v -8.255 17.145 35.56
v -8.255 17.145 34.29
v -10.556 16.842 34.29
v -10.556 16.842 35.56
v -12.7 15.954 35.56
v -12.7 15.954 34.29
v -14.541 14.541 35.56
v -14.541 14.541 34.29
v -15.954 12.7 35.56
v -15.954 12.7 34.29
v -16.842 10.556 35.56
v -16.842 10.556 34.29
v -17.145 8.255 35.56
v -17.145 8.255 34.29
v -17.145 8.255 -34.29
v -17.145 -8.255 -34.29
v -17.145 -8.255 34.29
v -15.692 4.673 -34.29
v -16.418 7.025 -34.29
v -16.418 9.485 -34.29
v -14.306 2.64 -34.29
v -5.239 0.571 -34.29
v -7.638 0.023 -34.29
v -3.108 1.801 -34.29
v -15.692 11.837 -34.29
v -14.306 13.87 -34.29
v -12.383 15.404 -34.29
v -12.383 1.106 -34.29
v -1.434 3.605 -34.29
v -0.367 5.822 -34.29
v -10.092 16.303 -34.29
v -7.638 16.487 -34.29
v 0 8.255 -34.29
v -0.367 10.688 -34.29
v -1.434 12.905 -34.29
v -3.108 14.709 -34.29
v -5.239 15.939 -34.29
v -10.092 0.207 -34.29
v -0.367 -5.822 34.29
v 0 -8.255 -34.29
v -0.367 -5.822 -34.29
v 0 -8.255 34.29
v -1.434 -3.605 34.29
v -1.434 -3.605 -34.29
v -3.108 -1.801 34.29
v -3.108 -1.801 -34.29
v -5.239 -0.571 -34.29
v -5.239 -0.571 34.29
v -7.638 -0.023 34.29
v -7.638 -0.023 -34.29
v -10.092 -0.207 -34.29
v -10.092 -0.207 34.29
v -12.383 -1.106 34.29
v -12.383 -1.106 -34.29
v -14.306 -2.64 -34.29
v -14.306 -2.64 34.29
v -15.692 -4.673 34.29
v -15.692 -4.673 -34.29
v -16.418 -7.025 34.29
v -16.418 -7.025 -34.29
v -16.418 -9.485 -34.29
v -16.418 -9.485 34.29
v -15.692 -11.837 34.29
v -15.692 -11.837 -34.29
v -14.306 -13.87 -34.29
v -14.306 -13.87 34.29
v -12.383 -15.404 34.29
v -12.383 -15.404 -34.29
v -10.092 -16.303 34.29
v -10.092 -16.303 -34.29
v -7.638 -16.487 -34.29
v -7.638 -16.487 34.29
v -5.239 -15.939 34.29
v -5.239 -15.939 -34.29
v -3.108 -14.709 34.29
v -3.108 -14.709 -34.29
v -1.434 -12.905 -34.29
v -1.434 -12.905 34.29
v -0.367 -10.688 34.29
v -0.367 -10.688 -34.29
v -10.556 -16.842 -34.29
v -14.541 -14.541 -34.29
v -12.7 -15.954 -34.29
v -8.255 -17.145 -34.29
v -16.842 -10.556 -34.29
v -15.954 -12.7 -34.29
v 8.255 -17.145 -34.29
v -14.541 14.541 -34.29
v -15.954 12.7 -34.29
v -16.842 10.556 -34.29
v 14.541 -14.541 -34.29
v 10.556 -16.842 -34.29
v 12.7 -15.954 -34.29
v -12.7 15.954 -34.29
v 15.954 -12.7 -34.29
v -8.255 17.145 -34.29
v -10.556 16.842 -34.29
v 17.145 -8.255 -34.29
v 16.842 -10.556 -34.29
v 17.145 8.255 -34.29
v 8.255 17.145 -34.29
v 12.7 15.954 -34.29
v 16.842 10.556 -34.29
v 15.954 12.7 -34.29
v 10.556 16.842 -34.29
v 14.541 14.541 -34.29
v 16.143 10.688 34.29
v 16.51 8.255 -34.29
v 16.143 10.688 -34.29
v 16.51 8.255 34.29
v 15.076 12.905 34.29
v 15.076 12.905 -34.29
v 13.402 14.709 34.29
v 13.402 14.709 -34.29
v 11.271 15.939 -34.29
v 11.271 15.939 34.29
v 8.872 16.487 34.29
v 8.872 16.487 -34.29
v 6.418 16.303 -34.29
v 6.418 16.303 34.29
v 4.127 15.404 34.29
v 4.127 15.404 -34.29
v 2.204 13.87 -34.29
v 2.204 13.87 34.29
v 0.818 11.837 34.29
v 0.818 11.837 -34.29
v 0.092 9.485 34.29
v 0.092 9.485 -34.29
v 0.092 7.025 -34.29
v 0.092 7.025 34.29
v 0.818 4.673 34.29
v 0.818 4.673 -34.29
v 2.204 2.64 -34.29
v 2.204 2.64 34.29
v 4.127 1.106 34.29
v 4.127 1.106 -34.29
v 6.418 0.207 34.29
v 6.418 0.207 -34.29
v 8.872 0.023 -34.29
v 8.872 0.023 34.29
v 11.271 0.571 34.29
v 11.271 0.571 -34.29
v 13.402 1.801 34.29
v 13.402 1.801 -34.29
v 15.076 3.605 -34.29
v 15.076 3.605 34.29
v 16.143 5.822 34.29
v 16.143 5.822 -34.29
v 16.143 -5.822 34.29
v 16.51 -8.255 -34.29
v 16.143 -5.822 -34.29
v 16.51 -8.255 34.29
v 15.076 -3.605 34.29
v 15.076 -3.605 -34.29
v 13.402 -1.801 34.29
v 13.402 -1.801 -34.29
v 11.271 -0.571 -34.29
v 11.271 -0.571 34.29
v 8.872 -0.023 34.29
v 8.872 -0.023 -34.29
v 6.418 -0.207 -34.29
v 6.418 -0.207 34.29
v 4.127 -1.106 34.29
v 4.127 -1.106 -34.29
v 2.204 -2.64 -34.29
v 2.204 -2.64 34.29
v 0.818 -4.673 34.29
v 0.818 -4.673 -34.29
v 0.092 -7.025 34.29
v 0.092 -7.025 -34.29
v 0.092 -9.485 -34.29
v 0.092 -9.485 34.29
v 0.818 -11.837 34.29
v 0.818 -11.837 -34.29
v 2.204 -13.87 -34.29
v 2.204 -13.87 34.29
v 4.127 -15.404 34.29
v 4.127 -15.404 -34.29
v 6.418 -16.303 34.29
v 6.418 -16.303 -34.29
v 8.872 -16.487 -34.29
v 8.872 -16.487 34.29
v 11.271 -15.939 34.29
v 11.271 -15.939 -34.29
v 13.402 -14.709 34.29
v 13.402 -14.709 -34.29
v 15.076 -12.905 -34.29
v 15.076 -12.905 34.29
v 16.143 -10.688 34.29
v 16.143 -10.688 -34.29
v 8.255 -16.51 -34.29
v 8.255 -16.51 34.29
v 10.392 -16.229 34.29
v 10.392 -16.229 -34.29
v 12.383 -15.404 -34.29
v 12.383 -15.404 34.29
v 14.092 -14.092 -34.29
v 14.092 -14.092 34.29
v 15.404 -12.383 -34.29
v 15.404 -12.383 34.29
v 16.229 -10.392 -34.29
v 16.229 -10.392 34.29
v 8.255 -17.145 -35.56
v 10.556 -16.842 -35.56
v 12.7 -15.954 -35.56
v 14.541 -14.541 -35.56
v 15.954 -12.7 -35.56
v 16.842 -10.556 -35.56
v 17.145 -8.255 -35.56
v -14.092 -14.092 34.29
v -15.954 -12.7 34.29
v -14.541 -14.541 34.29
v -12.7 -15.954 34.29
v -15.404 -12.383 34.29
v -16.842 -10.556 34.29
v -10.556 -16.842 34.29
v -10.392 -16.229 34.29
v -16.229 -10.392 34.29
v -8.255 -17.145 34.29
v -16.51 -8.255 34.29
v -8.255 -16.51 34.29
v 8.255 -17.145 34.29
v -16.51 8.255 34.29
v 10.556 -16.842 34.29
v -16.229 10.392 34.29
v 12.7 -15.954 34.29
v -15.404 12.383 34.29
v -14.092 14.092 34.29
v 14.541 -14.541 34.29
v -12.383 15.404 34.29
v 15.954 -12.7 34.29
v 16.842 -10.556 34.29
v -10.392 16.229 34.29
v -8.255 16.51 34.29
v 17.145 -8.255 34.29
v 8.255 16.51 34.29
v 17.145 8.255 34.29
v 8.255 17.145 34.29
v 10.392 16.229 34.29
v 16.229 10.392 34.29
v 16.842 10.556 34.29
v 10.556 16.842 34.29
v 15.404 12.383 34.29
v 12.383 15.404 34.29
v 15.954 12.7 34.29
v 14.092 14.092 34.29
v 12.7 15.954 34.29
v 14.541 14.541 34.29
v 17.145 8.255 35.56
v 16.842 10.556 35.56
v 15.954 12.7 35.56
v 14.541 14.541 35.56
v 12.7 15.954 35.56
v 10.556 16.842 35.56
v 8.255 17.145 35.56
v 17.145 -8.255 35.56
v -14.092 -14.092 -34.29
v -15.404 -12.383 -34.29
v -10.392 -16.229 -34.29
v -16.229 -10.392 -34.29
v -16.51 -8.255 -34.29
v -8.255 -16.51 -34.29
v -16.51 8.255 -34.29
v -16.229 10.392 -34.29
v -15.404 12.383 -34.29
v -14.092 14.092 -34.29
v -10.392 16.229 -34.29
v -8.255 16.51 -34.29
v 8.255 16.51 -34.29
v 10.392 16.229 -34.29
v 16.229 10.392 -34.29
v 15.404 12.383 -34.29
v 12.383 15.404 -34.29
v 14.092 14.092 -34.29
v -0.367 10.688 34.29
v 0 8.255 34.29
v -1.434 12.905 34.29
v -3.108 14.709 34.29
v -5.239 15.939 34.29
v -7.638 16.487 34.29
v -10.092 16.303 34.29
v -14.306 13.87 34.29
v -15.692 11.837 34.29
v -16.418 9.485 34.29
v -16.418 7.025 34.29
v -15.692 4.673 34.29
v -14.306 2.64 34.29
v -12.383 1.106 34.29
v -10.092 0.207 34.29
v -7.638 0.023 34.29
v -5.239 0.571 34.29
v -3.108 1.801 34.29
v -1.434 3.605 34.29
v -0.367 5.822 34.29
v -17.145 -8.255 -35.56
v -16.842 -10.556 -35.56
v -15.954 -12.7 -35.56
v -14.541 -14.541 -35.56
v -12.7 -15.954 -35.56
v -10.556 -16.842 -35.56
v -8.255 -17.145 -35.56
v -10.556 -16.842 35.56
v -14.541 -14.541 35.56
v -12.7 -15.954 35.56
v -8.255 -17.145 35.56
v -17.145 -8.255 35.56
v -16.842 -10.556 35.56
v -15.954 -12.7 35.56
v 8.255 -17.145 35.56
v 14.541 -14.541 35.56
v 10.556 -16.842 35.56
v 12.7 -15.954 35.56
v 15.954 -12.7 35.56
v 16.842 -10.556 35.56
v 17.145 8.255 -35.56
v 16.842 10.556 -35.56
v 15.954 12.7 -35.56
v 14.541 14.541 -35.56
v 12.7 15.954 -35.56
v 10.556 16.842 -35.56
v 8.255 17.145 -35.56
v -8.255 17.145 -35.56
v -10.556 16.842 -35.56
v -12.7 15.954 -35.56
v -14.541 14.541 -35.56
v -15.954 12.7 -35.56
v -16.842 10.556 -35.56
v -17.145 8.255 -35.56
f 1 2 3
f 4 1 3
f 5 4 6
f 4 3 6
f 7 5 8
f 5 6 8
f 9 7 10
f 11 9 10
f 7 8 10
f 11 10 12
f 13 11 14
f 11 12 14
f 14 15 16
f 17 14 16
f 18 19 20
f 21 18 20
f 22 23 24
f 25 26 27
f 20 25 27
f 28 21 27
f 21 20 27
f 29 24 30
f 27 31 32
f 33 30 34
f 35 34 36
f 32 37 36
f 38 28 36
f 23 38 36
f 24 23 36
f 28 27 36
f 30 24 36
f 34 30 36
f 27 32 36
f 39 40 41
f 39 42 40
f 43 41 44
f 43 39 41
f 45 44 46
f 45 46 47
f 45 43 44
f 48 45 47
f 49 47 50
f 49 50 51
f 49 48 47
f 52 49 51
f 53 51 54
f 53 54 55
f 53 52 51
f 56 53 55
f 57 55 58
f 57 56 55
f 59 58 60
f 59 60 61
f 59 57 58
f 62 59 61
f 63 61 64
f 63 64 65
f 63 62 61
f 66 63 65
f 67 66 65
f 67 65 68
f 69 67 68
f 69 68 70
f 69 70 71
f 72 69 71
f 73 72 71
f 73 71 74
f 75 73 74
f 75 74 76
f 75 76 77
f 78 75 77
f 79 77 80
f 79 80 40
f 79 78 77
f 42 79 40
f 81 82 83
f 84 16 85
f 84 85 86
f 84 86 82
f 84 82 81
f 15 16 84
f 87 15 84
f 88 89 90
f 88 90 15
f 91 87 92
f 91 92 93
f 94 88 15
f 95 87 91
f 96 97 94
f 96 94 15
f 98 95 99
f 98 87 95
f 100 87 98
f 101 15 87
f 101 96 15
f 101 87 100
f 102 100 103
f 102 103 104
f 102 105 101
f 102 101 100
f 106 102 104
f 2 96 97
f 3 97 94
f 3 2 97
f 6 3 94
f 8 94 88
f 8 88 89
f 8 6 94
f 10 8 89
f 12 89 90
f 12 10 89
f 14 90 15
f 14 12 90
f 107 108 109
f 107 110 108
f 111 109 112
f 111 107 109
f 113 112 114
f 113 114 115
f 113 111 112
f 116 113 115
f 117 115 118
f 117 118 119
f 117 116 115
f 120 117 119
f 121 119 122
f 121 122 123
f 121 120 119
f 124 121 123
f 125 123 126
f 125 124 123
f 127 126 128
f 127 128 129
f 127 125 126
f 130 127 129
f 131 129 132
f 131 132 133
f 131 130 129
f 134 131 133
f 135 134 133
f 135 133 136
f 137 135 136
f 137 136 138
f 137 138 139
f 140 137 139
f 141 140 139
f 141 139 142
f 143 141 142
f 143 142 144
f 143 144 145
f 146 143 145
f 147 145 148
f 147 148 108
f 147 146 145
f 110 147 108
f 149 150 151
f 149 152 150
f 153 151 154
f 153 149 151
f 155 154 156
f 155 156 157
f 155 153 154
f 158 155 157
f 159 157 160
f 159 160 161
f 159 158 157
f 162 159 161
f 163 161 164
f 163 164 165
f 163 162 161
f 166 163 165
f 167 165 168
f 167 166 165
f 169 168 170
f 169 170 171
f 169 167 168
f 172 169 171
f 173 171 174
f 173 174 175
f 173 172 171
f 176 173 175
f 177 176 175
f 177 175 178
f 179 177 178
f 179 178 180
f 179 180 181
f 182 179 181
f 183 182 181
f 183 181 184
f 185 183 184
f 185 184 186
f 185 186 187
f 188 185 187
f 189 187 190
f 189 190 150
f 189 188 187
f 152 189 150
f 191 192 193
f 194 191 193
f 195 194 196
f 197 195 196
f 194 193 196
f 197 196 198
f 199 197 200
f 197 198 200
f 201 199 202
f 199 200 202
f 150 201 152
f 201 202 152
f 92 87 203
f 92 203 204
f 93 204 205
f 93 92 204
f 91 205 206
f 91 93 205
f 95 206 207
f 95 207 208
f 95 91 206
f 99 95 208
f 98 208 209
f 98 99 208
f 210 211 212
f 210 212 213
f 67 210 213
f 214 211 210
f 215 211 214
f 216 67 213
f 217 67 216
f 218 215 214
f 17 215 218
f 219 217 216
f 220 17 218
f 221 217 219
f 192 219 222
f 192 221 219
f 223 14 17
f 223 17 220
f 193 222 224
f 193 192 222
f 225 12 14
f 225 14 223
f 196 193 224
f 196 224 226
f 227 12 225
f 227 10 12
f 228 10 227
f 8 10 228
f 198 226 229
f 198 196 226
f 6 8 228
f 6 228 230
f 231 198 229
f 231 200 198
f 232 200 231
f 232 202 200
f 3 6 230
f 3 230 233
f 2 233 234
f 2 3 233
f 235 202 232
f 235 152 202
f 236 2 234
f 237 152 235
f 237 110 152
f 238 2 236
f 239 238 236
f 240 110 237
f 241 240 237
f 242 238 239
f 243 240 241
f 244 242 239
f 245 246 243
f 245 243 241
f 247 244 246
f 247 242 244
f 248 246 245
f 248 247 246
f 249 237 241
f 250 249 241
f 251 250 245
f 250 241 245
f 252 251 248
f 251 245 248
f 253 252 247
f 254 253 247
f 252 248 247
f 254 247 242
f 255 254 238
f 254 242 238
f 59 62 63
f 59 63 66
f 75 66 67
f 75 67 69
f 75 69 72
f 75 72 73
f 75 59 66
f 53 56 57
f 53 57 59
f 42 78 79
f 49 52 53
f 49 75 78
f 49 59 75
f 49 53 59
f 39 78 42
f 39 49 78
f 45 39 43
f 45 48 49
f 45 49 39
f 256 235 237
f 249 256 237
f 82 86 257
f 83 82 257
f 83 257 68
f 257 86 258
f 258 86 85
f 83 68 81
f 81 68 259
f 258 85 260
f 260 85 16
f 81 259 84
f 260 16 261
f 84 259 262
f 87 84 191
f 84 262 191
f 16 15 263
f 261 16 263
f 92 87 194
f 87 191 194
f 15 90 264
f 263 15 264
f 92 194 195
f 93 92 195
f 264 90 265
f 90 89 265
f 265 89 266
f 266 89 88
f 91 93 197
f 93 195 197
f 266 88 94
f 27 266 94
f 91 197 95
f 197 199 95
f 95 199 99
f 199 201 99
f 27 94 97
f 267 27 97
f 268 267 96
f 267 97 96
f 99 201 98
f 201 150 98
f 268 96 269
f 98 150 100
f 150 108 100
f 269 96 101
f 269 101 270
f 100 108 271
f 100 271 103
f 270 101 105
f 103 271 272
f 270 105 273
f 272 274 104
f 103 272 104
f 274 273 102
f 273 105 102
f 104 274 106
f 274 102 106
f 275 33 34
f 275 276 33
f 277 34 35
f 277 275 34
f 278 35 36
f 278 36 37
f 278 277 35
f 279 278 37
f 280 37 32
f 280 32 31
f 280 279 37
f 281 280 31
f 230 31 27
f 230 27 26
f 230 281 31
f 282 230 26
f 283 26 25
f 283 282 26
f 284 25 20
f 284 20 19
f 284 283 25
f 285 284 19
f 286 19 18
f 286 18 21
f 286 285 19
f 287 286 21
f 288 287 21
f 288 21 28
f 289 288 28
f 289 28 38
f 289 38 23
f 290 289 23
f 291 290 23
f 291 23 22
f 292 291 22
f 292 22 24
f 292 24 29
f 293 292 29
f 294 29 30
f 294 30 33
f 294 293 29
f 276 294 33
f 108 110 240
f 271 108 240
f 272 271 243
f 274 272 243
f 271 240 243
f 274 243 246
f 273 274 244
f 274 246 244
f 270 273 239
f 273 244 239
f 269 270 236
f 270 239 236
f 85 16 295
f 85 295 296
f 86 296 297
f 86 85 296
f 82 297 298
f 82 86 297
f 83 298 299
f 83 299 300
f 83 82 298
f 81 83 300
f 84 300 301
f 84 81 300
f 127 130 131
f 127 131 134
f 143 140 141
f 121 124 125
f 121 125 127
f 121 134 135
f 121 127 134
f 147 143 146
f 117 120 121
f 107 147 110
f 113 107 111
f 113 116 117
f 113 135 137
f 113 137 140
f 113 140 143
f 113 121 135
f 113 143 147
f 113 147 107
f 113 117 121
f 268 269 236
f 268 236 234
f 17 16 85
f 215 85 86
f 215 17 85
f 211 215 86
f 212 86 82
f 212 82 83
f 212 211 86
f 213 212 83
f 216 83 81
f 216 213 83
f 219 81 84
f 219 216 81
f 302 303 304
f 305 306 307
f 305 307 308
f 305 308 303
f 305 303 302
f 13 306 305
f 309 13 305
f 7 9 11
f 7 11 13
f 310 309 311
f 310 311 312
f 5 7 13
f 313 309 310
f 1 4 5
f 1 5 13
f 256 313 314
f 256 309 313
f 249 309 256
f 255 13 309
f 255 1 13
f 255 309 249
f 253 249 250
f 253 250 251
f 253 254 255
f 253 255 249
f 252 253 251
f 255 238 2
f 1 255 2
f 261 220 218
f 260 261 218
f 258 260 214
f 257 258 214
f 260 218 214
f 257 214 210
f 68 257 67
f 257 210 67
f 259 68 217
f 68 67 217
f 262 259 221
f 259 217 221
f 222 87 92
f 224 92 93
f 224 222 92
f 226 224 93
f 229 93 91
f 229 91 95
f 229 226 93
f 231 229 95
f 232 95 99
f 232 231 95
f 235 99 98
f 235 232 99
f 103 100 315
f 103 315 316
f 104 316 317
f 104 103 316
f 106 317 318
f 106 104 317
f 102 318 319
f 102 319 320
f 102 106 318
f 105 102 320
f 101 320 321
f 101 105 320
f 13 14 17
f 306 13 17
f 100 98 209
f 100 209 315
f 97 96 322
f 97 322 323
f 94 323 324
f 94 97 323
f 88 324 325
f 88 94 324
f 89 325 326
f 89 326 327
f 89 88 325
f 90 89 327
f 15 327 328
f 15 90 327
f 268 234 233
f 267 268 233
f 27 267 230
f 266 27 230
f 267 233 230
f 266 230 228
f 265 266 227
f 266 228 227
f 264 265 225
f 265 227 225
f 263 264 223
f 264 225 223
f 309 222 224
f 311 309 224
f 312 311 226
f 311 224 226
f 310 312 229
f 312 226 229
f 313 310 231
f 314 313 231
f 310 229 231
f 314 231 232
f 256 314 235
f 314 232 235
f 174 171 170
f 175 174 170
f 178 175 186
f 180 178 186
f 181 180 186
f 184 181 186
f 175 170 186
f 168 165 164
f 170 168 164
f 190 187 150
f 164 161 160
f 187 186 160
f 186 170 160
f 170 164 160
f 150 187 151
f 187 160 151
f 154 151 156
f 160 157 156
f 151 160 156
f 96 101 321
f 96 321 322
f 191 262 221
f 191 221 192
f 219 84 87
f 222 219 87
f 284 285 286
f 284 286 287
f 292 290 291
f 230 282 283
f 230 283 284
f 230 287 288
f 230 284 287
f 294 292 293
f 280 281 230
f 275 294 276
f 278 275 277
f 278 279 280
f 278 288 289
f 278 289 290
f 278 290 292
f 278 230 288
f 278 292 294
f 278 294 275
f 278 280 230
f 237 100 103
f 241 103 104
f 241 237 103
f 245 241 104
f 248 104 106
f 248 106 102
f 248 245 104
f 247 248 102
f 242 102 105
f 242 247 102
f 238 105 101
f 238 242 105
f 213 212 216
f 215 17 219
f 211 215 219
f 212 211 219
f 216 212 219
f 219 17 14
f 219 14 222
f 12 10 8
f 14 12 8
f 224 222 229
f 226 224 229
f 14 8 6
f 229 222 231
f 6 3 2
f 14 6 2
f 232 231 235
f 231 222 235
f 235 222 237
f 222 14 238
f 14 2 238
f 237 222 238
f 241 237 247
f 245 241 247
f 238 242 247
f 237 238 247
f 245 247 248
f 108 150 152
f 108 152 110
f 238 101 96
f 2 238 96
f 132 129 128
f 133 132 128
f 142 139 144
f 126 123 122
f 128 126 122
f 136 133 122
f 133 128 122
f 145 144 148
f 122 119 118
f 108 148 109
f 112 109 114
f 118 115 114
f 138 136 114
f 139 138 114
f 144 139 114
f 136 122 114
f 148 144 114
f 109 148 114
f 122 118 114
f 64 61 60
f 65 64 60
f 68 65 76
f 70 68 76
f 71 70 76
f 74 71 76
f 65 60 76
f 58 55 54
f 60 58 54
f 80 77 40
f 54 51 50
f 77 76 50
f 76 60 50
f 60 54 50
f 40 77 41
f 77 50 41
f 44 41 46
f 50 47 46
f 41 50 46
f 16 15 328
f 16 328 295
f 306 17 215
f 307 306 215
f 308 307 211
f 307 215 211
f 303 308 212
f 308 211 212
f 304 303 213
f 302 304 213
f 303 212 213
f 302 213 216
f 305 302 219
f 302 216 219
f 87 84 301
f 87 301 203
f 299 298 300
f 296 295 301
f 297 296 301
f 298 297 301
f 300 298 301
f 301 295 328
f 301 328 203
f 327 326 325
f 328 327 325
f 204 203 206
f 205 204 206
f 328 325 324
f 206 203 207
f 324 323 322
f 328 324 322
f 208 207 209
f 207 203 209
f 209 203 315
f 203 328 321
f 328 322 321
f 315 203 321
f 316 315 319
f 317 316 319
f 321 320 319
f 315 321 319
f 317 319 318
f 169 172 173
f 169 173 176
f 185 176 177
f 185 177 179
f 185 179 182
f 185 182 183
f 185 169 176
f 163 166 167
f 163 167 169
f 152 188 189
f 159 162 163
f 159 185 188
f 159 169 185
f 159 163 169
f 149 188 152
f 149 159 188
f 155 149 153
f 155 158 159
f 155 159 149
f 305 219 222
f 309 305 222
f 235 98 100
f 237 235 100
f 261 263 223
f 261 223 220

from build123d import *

# Parameters (mm, degrees)
SKETCH2_R           = 8.255
EXTRUDE1_DEPTH      = 34.29
EXTRUDE1_2_DEPTH    = 34.29
EXTRUDE1_3_DEPTH    = 34.29
EXTRUDE1_4_DEPTH    = 34.29
EXTRUDE2_DEPTH      = 68.58
BOSS_EXTRUDE2_DEPTH = 1.27


with BuildPart() as part:
    # Sketch2 → Extrude1 (new body, symmetric)
    with BuildSketch(Plane.XY):
        with Locations((-8.255, -8.255)):
            Circle(SKETCH2_R)
    extrude(amount=EXTRUDE1_DEPTH, both=True)


with BuildPart() as body_2:
    # Sketch2 → Extrude1 2 (new body, symmetric)
    with BuildSketch(Plane.XY):
        with Locations((8.255, -8.255)):
            Circle(SKETCH2_R)
    extrude(amount=EXTRUDE1_2_DEPTH, both=True)


with BuildPart() as body_3:
    # Sketch2 → Extrude1 3 (new body, symmetric)
    with BuildSketch(Plane.XY):
        with Locations((8.255, 8.255)):
            Circle(SKETCH2_R)
    extrude(amount=EXTRUDE1_3_DEPTH, both=True)


with BuildPart() as body_4:
    # Sketch2 → Extrude1 4 (new body, symmetric)
    with BuildSketch(Plane.XY):
        with Locations((-8.255, 8.255)):
            Circle(SKETCH2_R)
    extrude(amount=EXTRUDE1_4_DEPTH, both=True)


with BuildPart() as body_5:
    # Sketch3 → Extrude2 (new body)
    with BuildSketch(Plane.XY.offset(34.29)):
        with BuildLine():
            Line((8.255, 17.145), (-8.255, 17.145))
            ThreePointArc((-8.255, 17.145), (-14.541179285, 14.541179285), (-17.145, 8.255))
            Line((-17.145, 8.255), (-17.145, -8.255))
            ThreePointArc((-17.145, -8.255), (-14.541179285, -14.541179285), (-8.255, -17.145))
            Line((-8.255, -17.145), (8.255, -17.145))
            ThreePointArc((8.255, -17.145), (14.541179285, -14.541179285), (17.145, -8.255))
            Line((17.145, -8.255), (17.145, 8.255))
            ThreePointArc((17.145, 8.255), (14.541179285, 14.541179285), (8.255, 17.145))
        make_face()
        with BuildLine():
            Line((-16.51, 8.255), (-16.51, -8.255))
            ThreePointArc((-16.51, -8.255), (-14.092166479, -14.092166479), (-8.255, -16.51))
            Line((-8.255, -16.51), (8.255, -16.51))
            ThreePointArc((8.255, -16.51), (14.092166479, -14.092166479), (16.51, -8.255))
            Line((16.51, -8.255), (16.51, 8.255))
            ThreePointArc((16.51, 8.255), (14.092166479, 14.092166479), (8.255, 16.51))
            Line((8.255, 16.51), (-8.255, 16.51))
            ThreePointArc((-8.255, 16.51), (-14.092166479, 14.092166479), (-16.51, 8.255))
        make_face(mode=Mode.SUBTRACT)
    extrude(amount=-EXTRUDE2_DEPTH)


with BuildPart() as body_6:
    # Sketch4 → Boss-Extrude2 (new body)
    with BuildSketch(Plane.XY.offset(34.29)):
        with BuildLine():
            Line((8.255, 17.145), (-8.255, 17.145))
            ThreePointArc((-8.255, 17.145), (-14.541179285, 14.541179285), (-17.145, 8.255))
            Line((-17.145, 8.255), (-17.145, -8.255))
            ThreePointArc((-17.145, -8.255), (-14.541179285, -14.541179285), (-8.255, -17.145))
            Line((-8.255, -17.145), (8.255, -17.145))
            ThreePointArc((8.255, -17.145), (14.541179285, -14.541179285), (17.145, -8.255))
            Line((17.145, -8.255), (17.145, 8.255))
            ThreePointArc((17.145, 8.255), (14.541179285, 14.541179285), (8.255, 17.145))
        make_face()
    extrude(amount=BOSS_EXTRUDE2_DEPTH)


with BuildPart() as body_7:
    # Mirror1: mirrored copy
    add(body_6.part.mirror(Plane.XY))


solid = Compound([part.part, body_2.part, body_3.part, body_4.part, body_5.part, body_6.part, body_7.part])
